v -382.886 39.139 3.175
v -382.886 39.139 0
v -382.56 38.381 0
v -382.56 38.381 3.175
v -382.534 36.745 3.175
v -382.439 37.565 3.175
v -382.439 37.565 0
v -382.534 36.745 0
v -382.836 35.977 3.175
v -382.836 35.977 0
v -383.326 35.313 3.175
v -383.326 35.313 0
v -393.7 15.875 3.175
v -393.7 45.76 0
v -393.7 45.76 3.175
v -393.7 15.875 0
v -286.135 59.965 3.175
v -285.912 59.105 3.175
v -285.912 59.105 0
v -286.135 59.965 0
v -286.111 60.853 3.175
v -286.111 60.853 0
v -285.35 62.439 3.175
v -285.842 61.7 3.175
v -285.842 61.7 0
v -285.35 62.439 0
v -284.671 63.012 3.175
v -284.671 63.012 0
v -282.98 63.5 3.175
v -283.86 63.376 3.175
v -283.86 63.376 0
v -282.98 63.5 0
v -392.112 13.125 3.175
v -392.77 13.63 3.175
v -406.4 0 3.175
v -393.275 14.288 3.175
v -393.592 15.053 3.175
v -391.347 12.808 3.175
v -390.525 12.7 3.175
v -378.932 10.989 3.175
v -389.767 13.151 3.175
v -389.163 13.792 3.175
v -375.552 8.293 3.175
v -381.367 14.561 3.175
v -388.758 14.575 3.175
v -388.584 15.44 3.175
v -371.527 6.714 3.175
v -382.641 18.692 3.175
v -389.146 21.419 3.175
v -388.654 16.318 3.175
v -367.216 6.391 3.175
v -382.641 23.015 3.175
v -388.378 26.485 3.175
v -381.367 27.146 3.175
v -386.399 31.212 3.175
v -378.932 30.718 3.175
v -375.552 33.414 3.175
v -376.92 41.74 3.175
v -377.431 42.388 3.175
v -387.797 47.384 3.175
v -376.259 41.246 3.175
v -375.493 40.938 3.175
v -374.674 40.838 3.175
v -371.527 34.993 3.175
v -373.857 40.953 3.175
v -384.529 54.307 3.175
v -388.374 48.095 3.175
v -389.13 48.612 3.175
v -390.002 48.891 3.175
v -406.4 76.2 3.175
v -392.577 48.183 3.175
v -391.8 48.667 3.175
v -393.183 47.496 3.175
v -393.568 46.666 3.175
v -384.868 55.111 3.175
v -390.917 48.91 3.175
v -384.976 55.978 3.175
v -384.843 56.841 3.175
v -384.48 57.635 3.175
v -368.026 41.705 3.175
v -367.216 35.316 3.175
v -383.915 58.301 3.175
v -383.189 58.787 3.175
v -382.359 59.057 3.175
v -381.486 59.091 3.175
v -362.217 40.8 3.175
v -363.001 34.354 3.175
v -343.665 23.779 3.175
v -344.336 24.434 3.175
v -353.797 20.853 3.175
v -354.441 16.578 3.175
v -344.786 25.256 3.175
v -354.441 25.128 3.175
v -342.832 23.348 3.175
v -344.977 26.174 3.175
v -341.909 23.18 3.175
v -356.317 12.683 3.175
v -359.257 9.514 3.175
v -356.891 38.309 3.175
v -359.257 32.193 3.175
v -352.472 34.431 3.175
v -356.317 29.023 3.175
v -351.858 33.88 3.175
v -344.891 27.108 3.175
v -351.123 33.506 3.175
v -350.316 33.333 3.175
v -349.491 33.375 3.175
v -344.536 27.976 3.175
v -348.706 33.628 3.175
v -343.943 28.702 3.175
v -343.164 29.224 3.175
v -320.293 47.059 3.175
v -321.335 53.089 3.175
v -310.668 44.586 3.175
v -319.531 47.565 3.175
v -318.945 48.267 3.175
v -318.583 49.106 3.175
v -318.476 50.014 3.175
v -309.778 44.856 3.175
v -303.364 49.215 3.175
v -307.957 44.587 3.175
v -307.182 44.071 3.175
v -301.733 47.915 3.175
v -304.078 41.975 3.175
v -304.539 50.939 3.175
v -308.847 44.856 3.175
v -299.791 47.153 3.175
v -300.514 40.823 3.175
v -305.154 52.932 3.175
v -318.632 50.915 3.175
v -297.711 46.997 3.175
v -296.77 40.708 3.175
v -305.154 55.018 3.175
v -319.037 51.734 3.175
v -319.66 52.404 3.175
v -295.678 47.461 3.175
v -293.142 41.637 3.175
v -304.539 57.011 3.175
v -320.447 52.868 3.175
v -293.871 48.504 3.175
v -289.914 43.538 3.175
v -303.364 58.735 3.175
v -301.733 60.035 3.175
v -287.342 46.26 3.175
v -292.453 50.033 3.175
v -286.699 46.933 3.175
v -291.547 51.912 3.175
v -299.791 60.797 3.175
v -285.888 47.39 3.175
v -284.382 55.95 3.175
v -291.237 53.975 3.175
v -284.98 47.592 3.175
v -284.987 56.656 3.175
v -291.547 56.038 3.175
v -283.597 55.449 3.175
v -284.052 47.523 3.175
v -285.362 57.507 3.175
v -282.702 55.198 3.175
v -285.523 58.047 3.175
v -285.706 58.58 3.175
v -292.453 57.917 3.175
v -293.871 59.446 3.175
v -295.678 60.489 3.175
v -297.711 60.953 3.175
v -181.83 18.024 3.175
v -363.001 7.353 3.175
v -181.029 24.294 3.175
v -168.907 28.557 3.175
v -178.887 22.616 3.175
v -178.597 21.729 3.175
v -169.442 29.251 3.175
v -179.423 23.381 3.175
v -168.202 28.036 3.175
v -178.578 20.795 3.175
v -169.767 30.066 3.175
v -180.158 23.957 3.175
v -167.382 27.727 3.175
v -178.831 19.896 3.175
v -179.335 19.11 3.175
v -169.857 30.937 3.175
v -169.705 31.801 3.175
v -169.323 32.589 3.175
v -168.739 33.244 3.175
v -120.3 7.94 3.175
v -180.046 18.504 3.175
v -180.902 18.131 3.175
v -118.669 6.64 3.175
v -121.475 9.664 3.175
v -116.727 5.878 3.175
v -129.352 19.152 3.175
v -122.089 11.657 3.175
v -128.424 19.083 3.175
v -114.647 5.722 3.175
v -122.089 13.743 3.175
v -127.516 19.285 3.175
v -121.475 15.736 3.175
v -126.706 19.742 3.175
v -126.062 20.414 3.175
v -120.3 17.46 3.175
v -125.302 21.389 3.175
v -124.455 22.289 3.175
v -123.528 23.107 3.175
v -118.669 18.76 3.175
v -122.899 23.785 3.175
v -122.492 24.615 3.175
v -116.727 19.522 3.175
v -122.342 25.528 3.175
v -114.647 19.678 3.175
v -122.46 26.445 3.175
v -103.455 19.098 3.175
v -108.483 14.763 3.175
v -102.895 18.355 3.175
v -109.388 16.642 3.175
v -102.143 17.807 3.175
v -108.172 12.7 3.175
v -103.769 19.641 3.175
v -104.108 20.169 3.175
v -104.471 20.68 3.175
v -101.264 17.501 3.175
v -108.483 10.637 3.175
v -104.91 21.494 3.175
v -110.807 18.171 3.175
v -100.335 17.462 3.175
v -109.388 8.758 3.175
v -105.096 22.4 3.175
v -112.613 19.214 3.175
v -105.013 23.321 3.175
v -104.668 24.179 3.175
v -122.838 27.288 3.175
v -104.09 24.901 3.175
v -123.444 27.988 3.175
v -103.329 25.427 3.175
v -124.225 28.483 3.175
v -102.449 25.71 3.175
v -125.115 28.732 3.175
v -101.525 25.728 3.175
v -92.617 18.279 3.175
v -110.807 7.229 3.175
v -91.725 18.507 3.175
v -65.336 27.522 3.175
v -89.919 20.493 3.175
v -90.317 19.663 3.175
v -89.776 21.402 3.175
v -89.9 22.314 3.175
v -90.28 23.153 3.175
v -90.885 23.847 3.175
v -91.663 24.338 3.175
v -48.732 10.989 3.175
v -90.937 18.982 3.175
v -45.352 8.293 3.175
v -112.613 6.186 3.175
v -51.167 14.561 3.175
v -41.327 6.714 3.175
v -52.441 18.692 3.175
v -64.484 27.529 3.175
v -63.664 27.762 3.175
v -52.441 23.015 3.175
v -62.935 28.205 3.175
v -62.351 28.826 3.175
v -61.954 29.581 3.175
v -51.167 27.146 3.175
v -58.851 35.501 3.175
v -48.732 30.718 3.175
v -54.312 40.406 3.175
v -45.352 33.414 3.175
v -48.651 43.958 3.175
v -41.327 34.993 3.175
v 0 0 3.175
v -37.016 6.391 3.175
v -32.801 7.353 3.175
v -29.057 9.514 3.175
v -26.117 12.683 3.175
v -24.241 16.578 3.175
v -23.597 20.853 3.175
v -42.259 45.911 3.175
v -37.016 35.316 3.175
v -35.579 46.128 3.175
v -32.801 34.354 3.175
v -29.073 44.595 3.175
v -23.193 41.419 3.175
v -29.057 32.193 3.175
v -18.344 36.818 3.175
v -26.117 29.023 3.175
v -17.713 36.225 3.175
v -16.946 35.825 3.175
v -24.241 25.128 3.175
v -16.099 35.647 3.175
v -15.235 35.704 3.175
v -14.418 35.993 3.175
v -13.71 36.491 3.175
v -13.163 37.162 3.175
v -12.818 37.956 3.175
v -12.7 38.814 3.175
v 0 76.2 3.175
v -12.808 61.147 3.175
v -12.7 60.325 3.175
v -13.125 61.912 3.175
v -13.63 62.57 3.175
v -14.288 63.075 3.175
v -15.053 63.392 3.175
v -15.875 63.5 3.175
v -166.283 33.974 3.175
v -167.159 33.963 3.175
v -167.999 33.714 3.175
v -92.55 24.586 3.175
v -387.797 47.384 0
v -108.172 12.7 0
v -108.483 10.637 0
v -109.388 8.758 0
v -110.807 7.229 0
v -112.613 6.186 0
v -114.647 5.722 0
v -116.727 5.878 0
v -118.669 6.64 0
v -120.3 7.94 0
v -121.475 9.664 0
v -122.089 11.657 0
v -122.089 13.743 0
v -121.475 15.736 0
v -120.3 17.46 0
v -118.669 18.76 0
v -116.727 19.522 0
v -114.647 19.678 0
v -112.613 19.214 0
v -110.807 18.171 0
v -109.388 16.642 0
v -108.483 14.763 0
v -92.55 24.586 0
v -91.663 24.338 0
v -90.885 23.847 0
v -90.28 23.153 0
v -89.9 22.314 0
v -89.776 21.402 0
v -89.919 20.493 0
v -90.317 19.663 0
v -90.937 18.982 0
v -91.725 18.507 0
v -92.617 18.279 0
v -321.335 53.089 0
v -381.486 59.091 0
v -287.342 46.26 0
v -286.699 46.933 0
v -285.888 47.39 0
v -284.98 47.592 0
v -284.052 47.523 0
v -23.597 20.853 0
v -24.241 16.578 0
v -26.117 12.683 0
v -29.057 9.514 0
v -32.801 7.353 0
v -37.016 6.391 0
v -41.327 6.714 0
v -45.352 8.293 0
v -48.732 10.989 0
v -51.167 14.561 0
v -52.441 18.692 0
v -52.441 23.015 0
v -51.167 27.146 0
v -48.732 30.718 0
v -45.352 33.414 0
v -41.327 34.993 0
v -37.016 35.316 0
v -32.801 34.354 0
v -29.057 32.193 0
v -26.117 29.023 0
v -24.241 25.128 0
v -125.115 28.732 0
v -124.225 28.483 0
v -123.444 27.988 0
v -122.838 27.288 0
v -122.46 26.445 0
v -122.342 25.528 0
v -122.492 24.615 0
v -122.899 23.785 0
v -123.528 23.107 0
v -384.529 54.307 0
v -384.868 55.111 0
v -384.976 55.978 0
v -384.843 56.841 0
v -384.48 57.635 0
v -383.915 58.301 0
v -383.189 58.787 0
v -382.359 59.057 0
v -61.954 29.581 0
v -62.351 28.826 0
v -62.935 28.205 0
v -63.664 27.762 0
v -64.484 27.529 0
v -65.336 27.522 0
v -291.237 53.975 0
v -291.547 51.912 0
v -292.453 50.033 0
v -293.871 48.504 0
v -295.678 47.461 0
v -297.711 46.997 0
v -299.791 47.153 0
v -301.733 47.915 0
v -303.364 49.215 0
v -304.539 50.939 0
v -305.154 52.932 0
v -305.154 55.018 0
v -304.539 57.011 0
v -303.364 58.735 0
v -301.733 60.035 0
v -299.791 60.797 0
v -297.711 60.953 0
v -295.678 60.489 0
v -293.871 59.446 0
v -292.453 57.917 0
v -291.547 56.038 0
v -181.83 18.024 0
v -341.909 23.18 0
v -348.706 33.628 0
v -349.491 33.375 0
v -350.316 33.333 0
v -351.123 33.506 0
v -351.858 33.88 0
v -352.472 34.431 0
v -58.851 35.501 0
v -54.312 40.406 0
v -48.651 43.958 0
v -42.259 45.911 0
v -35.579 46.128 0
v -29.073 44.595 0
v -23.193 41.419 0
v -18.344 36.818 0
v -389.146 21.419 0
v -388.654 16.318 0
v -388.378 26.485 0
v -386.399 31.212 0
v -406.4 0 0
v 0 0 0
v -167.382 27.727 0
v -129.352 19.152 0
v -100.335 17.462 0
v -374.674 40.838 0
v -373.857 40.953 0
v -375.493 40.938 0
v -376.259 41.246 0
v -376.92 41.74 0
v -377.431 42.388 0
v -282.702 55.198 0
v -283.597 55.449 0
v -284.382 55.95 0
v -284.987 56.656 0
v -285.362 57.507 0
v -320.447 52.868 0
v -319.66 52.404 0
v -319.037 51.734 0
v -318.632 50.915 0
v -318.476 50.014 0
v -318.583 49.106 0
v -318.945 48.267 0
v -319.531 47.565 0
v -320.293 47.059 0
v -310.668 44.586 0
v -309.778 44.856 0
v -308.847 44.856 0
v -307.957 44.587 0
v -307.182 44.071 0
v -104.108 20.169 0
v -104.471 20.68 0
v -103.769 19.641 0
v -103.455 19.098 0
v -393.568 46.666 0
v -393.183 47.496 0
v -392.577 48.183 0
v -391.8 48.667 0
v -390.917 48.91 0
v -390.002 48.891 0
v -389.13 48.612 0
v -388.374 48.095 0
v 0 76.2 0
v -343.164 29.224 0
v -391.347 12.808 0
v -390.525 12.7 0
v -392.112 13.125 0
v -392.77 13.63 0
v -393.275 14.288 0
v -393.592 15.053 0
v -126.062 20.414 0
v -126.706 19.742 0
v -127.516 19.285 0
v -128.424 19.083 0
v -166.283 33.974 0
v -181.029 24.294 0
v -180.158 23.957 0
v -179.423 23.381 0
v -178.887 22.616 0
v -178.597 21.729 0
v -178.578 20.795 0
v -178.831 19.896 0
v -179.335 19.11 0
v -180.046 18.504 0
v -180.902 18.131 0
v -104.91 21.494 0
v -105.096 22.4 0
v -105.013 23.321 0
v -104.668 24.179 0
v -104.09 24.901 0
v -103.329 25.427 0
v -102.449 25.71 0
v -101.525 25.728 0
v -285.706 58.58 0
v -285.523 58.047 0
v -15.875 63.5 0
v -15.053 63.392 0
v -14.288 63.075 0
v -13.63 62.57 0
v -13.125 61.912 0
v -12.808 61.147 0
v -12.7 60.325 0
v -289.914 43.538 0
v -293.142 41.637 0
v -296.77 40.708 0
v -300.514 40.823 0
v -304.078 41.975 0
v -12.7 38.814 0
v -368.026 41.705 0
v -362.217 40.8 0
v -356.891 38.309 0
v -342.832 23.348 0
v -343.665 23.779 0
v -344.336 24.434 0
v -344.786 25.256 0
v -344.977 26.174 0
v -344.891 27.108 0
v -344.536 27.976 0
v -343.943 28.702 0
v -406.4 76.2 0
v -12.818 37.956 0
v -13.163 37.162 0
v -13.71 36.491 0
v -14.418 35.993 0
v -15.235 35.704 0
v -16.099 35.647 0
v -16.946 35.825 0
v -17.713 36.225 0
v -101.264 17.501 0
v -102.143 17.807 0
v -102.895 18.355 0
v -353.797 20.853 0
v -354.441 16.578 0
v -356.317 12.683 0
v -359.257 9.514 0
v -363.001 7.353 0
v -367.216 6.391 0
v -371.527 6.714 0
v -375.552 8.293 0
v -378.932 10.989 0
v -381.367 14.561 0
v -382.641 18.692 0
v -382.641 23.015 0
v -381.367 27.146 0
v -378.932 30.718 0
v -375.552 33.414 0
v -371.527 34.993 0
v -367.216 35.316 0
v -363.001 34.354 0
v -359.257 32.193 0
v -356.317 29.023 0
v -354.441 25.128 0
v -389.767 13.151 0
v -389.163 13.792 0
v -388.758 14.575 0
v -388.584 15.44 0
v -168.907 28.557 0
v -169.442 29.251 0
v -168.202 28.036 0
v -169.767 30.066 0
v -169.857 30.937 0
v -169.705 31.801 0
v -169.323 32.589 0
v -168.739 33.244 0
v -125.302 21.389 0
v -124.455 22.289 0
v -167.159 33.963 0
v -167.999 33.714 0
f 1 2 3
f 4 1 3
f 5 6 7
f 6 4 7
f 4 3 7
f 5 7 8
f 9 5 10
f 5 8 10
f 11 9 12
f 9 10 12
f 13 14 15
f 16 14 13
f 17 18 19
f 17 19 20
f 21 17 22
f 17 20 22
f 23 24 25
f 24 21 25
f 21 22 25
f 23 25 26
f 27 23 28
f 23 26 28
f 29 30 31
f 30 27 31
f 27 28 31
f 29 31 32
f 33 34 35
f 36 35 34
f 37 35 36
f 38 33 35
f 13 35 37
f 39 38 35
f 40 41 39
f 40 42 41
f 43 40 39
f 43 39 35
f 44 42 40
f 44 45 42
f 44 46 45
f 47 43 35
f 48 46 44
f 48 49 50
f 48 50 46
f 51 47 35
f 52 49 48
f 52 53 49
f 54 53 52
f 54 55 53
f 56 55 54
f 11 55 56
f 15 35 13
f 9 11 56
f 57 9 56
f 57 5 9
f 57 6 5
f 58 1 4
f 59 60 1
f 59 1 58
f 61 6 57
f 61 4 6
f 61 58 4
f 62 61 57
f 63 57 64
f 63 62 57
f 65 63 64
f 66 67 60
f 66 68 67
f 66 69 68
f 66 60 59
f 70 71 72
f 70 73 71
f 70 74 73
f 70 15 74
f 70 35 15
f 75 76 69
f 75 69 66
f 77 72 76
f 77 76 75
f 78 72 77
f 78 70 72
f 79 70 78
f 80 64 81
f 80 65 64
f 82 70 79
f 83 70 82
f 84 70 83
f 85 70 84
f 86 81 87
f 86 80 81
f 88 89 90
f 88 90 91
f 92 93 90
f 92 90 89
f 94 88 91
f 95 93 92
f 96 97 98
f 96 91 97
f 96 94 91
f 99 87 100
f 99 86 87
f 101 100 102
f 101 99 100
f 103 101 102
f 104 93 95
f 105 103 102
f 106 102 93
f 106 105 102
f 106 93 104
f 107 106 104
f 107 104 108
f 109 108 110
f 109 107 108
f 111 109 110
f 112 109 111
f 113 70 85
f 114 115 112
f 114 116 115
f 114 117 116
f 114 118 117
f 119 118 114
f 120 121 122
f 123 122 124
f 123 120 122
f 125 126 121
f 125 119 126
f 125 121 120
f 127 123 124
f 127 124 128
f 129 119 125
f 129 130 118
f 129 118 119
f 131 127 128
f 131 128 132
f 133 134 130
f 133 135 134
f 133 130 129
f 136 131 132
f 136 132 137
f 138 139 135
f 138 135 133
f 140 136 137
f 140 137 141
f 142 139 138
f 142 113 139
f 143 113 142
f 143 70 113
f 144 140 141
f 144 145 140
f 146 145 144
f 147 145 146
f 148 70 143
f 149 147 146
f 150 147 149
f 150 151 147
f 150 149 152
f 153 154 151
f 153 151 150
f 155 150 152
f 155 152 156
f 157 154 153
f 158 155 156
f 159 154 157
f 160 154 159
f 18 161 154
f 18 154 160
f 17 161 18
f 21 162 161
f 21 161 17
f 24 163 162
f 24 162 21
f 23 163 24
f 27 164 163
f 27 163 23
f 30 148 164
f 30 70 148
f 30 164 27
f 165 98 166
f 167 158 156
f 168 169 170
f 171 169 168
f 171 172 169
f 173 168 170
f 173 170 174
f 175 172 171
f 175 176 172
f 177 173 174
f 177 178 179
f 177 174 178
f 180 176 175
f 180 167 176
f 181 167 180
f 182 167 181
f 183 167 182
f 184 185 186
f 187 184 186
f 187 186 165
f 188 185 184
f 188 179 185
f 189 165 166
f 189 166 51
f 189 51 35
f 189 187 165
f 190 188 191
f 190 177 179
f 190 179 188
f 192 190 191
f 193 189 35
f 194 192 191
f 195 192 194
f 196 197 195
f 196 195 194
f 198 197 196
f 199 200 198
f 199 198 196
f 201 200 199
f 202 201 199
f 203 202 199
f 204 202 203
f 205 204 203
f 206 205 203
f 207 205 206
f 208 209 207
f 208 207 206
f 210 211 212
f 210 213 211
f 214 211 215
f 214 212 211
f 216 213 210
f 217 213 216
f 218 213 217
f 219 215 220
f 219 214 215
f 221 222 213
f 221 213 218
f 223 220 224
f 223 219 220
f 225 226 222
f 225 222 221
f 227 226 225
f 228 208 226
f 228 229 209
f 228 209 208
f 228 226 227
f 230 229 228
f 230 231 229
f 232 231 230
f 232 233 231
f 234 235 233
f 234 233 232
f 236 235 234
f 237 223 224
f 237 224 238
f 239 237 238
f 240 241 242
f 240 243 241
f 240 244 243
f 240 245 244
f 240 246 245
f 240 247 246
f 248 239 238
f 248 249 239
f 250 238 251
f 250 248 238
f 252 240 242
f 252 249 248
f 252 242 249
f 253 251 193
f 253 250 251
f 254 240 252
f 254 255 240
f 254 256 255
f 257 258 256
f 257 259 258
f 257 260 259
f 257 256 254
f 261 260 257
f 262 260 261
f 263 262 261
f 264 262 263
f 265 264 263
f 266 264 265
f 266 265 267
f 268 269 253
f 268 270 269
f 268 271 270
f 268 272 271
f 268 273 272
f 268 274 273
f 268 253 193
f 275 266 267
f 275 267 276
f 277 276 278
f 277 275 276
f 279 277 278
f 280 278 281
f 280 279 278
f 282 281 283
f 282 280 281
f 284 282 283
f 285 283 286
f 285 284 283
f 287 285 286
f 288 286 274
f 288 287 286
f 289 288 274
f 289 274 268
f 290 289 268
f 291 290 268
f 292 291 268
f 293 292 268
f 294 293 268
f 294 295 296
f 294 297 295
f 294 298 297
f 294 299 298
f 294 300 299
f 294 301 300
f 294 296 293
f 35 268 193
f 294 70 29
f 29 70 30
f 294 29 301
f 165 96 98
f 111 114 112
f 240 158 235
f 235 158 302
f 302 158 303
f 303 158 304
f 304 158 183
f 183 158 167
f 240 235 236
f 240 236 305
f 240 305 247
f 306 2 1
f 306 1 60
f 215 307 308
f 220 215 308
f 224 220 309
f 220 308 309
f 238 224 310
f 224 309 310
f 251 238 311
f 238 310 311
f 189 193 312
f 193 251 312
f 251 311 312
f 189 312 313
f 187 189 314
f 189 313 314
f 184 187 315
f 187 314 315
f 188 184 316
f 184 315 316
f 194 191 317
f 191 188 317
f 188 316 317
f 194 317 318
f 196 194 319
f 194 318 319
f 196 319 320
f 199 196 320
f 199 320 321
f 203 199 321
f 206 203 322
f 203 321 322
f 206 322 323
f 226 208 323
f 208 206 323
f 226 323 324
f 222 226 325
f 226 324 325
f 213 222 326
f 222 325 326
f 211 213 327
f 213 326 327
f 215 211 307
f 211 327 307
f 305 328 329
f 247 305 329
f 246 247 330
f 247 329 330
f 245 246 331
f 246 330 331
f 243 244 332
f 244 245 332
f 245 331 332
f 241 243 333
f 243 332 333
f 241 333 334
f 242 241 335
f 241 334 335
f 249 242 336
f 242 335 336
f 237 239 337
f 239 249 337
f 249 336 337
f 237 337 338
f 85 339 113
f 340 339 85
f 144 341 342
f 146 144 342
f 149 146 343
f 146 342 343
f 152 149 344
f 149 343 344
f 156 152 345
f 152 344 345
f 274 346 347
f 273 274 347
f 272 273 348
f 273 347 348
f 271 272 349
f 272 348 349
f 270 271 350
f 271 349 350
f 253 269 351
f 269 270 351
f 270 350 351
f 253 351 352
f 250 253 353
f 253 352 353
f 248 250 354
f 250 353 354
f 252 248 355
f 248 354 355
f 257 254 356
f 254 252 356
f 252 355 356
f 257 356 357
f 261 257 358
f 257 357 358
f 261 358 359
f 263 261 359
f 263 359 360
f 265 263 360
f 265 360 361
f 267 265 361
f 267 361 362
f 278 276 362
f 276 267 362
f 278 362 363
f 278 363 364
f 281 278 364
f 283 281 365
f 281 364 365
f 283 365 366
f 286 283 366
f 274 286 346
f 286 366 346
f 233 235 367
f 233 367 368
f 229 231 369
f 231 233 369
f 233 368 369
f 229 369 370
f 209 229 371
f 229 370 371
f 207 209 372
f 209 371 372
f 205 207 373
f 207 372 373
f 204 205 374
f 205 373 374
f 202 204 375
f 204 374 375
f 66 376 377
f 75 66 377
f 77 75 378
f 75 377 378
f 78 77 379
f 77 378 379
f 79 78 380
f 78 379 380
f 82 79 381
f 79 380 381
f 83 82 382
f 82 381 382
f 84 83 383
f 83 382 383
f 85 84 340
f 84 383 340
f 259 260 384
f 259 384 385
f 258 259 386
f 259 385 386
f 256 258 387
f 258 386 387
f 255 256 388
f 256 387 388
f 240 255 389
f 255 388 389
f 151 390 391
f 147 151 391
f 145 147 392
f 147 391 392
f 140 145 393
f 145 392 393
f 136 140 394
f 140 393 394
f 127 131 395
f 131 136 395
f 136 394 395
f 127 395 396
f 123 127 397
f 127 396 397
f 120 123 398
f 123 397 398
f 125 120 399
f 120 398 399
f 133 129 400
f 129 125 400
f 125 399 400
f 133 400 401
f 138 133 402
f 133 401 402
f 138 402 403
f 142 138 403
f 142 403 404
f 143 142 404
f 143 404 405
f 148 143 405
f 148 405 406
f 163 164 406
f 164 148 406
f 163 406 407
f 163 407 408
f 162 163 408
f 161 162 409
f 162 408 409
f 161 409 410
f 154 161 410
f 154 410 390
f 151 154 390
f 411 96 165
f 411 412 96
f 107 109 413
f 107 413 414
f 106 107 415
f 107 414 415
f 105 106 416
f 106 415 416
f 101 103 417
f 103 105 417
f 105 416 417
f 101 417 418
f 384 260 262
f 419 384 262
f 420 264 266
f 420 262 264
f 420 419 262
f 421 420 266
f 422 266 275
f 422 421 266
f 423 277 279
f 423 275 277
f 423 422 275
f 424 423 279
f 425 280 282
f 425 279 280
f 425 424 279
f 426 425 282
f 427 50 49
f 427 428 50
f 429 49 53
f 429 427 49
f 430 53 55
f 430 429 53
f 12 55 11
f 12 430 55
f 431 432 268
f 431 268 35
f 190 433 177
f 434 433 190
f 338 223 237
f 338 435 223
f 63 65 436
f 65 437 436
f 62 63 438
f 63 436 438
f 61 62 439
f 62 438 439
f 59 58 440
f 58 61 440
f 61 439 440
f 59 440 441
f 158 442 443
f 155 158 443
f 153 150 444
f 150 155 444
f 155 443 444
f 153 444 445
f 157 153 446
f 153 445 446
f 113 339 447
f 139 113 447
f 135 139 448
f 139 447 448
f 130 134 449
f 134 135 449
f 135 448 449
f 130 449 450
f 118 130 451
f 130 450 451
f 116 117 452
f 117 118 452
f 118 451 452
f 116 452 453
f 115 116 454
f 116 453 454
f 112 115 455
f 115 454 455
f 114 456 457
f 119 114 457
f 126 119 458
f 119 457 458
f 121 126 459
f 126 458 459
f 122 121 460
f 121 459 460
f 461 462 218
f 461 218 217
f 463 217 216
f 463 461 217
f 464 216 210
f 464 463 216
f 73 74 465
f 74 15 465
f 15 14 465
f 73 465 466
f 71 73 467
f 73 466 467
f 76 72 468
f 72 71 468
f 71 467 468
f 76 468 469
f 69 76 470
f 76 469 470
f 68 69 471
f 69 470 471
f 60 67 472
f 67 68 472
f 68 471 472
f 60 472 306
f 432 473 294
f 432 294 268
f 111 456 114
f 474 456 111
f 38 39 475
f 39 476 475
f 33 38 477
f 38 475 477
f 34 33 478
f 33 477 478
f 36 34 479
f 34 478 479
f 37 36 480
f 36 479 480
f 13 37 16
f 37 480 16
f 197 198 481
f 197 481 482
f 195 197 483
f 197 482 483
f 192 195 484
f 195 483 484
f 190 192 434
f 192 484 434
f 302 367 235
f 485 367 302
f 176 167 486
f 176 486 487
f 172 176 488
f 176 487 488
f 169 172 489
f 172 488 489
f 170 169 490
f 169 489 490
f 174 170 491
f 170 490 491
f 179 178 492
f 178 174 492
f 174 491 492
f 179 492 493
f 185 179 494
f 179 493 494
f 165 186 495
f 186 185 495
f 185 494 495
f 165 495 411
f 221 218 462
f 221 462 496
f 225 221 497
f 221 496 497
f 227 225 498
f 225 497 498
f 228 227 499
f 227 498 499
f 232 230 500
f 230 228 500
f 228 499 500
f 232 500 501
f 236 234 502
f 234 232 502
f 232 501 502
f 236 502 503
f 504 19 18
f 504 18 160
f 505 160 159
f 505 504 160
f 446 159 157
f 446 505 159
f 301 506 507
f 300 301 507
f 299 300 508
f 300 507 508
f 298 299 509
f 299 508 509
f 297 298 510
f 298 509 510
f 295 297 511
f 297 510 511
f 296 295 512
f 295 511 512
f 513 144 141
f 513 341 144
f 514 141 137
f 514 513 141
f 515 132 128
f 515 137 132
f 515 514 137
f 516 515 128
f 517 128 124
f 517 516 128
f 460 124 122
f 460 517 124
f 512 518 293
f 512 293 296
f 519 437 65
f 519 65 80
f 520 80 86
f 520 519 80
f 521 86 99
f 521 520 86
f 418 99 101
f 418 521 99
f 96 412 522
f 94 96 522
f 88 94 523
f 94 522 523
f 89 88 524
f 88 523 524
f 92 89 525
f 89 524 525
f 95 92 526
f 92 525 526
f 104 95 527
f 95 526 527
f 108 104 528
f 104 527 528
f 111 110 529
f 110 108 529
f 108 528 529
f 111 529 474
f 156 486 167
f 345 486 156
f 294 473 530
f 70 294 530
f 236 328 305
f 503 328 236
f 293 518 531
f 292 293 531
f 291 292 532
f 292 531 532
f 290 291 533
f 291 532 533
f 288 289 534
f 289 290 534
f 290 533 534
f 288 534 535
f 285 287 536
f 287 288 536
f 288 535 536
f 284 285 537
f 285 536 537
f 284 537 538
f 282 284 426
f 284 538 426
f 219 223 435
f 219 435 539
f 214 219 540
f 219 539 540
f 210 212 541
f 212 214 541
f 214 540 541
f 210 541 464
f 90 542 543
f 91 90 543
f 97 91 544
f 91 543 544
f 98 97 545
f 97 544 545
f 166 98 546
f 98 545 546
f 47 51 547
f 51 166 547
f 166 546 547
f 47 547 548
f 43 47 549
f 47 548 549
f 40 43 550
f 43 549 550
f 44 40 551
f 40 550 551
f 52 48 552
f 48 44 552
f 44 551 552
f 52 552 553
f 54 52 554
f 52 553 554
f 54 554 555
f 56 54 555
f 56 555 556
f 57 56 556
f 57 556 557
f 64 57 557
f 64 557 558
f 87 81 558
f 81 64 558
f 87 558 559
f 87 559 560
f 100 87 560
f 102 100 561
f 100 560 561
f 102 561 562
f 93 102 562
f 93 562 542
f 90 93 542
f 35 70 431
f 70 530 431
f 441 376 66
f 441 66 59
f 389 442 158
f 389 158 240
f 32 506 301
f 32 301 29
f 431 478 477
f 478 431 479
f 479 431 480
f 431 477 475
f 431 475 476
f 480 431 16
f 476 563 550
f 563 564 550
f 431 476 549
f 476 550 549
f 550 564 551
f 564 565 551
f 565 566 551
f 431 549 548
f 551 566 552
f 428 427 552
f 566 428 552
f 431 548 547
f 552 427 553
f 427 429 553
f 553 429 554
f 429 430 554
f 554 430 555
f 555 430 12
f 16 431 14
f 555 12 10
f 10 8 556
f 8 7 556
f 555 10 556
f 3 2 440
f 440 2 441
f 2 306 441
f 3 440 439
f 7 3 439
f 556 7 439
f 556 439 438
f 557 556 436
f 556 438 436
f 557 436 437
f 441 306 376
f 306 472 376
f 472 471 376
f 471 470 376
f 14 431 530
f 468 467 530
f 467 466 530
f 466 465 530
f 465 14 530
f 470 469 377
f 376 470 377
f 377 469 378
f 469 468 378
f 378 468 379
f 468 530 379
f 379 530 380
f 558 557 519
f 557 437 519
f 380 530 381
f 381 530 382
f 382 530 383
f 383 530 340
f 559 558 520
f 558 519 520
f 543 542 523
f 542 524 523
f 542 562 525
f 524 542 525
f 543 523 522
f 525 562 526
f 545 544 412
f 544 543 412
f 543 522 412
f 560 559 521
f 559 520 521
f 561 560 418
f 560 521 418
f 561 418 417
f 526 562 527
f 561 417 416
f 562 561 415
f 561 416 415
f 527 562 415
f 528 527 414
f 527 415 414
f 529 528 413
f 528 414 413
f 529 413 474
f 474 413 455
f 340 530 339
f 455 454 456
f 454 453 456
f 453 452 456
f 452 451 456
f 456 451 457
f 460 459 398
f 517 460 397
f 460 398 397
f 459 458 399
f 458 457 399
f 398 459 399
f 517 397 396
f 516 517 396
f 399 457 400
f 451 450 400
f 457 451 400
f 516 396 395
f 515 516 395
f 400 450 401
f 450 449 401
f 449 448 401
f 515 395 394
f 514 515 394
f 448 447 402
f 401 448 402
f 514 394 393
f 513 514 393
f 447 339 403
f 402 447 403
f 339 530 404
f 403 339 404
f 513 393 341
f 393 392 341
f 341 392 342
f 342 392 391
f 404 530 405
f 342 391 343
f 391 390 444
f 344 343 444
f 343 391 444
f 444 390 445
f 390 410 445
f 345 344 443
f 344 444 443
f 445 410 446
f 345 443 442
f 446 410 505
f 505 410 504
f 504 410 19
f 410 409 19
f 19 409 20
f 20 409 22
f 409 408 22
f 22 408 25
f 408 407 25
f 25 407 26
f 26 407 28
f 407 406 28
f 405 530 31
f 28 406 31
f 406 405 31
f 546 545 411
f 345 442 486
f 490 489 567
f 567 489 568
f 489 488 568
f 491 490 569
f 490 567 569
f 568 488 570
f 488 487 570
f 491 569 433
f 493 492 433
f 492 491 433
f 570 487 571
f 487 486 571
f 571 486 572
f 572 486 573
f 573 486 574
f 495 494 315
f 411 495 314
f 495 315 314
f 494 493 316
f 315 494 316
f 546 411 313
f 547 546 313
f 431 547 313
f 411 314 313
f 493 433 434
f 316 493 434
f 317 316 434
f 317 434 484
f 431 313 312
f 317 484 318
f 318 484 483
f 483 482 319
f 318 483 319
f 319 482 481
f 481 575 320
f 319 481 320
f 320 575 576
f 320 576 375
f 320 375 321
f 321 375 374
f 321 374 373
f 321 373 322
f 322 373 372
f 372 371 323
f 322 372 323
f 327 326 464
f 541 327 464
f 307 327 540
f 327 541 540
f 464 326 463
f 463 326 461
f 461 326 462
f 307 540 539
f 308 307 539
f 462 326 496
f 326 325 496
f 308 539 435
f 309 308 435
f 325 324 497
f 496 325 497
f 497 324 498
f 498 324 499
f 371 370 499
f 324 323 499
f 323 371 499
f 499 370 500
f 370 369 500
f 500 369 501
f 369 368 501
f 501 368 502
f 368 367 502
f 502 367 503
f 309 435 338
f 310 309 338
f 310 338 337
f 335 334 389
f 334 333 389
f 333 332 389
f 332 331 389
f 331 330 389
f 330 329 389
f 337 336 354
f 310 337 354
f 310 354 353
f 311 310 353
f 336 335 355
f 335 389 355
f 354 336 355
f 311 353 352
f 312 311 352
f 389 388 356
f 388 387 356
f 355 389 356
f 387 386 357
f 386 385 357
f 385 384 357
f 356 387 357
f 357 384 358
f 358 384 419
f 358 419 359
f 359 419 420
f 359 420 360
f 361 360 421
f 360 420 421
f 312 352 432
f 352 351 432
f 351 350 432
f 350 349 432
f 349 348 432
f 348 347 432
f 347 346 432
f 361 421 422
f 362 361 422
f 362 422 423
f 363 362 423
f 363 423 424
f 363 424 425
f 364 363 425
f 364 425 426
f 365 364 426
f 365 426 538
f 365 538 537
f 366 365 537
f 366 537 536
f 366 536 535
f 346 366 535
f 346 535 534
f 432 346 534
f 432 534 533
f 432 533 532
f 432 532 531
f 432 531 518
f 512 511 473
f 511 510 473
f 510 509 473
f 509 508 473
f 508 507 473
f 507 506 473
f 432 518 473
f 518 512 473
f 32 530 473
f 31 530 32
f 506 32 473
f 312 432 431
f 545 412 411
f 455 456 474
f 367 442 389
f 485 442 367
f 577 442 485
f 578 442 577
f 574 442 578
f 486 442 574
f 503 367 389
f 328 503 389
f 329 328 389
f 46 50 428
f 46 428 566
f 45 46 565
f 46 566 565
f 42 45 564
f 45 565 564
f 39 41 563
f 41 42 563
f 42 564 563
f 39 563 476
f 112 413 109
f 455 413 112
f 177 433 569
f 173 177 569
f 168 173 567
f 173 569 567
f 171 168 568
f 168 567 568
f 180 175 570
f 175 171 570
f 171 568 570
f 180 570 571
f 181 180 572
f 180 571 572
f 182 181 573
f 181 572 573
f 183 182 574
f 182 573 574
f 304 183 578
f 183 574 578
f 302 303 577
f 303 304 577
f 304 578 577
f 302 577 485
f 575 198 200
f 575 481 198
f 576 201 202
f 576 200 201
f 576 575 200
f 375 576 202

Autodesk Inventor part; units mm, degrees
ref_plane "YZ Plane" through (0, 0, 0) normal (1, 0, 0) x (0, 1, 0)
ref_plane "XZ Plane" through (0, 0, 0) normal (0, 1, 0) x (-1, 0, 0)
ref_plane "XY Plane" through (0, 0, 0) normal (0, 0, 1) x (1, 0, 0)
sketch "Sketch1" plane through (0, 0, 0) normal (0, 0, 1) x (1, 0, 0)
  line L0 (-125.1151, 28.732) -> (-166.2826, 33.9736)
  arc A0 (-123.528, 23.1069) -> (-125.1151, 28.732) centre (-125.5161, 25.5824) ccw
  arc A1 (-123.528, 23.1069) -> (-126.0625, 20.4145) centre (-115.1699, 12.7) ccw
  arc A2 (-129.3518, 19.1523) -> (-126.0625, 20.4145) centre (-128.6535, 22.2495) ccw
  line L1 (-167.3819, 27.7268) -> (-129.3518, 19.1523)
  arc A3 (-166.2826, 33.9736) -> (-167.3819, 27.7268) centre (-166.6836, 30.824) ccw
  line L2 (-321.3346, 53.089) -> (-381.486, 59.0906)
  arc A4 (-320.2929, 47.0593) -> (-321.3346, 53.089) centre (-321.6498, 49.9297) ccw
  line L3 (-348.7058, 33.6279) -> (-320.2929, 47.0593)
  arc A5 (-352.4725, 34.4311) -> (-348.7058, 33.6279) centre (-350.0627, 36.4983) ccw
  arc A6 (-352.4725, 34.4311) -> (-373.8567, 40.9528) centre (-368.3, 20.8534) ccw
  arc A7 (-377.4306, 42.3884) -> (-373.8567, 40.9528) centre (-374.7028, 44.013) ccw
  line L4 (-384.529, 54.3066) -> (-377.4306, 42.3884)
  arc A8 (-381.486, 59.0906) -> (-384.529, 54.3066) centre (-381.8012, 55.9313) ccw
  arc A9 (-390.525, 12.7) -> (-388.6543, 16.3183) centre (-391.7533, 15.6278) ccw
  arc A10 (-393.7, 15.875) -> (-390.525, 12.7) centre (-390.525, 15.875) ccw
  line L5 (-393.7, 45.7598) -> (-393.7, 15.875)
  arc A11 (-387.7972, 47.3844) -> (-393.7, 45.7598) centre (-390.525, 45.7598) ccw
  line L6 (-382.8862, 39.139) -> (-387.7972, 47.3844)
  arc A12 (-383.3263, 35.3128) -> (-382.8862, 39.139) centre (-385.6141, 37.5143) ccw
  arc A13 (-383.3263, 35.3128) -> (-388.6543, 16.3183) centre (-368.3, 20.8534) ccw
  line L7 (-12.7, 38.8139) -> (-12.7, 60.325)
  arc A14 (-18.3444, 36.8183) -> (-12.7, 38.8139) centre (-15.875, 38.8139) ccw
  arc A15 (-18.3444, 36.8183) -> (-61.9536, 29.5806) centre (-38.1, 20.8534) ccw
  arc A16 (-65.3364, 27.5219) -> (-61.9536, 29.5806) centre (-64.9353, 30.6715) ccw
  line L8 (-282.7016, 55.1979) -> (-65.3364, 27.5219)
  arc A17 (-285.3624, 57.5073) -> (-282.7016, 55.1979) centre (-282.3006, 58.3475) ccw
  arc A18 (-285.3624, 57.5073) -> (-285.9117, 59.1048) centre (-298.2343, 53.975) ccw
  arc A19 (-282.9805, 63.5) -> (-285.9117, 59.1048) centre (-282.9805, 60.325) ccw
  line L9 (-15.875, 63.5) -> (-282.9805, 63.5)
  arc A20 (-12.7, 60.325) -> (-15.875, 63.5) centre (-15.875, 60.325) ccw
  arc A21 (-343.1641, 29.2238) -> (-341.9094, 23.18) centre (-341.8072, 26.3534) ccw
  line L10 (-310.6679, 44.5855) -> (-343.1641, 29.2238)
  arc A22 (-307.1824, 44.0709) -> (-310.6679, 44.5855) centre (-309.3109, 41.715) ccw
  arc A23 (-307.1824, 44.0709) -> (-287.3417, 46.2605) centre (-298.2343, 53.975) ccw
  arc A24 (-284.0524, 47.5227) -> (-287.3417, 46.2605) centre (-284.7507, 44.4255) ccw
  line L11 (-181.0291, 24.2944) -> (-284.0524, 47.5227)
  arc A25 (-181.8296, 18.0238) -> (-181.0291, 24.2944) centre (-181.7274, 21.1971) ccw
  line L12 (-341.9094, 23.18) -> (-181.8296, 18.0238)
  arc A26 (-103.4554, 19.0977) -> (-104.4707, 20.6804) centre (-115.1699, 12.7) ccw
  arc A27 (-101.5246, 25.7283) -> (-104.4707, 20.6804) centre (-101.9257, 22.5787) ccw
  line L13 (-92.5499, 24.5856) -> (-101.5246, 25.7283)
  arc A28 (-92.6169, 18.2787) -> (-92.5499, 24.5856) centre (-92.9509, 21.436) ccw
  line L14 (-100.3348, 17.4622) -> (-92.6169, 18.2787)
  arc A29 (-103.4554, 19.0977) -> (-100.3348, 17.4622) centre (-100.6689, 20.6195) ccw
  circle A30 centre (-298.2343, 53.975) radius 6.9977
  circle A31 centre (-115.1699, 12.7) radius 6.9977
  circle A32 centre (-38.1, 20.8534) radius 14.5034
  circle A33 centre (-368.3, 20.8534) radius 14.5034
  line L15 (0, 76.2) -> (0, 0)
  line L16 (0, 76.2) -> (-406.4, 76.2)
  line L17 (-406.4, 76.2) -> (-406.4, 0)
  line L18 (0, 0) -> (-406.4, 0)
  point P0 (0, 30.4367)
extrude "Extrusion1" add sketch "Sketch1" along normal blind 3.175
properties part number "Left left side"
